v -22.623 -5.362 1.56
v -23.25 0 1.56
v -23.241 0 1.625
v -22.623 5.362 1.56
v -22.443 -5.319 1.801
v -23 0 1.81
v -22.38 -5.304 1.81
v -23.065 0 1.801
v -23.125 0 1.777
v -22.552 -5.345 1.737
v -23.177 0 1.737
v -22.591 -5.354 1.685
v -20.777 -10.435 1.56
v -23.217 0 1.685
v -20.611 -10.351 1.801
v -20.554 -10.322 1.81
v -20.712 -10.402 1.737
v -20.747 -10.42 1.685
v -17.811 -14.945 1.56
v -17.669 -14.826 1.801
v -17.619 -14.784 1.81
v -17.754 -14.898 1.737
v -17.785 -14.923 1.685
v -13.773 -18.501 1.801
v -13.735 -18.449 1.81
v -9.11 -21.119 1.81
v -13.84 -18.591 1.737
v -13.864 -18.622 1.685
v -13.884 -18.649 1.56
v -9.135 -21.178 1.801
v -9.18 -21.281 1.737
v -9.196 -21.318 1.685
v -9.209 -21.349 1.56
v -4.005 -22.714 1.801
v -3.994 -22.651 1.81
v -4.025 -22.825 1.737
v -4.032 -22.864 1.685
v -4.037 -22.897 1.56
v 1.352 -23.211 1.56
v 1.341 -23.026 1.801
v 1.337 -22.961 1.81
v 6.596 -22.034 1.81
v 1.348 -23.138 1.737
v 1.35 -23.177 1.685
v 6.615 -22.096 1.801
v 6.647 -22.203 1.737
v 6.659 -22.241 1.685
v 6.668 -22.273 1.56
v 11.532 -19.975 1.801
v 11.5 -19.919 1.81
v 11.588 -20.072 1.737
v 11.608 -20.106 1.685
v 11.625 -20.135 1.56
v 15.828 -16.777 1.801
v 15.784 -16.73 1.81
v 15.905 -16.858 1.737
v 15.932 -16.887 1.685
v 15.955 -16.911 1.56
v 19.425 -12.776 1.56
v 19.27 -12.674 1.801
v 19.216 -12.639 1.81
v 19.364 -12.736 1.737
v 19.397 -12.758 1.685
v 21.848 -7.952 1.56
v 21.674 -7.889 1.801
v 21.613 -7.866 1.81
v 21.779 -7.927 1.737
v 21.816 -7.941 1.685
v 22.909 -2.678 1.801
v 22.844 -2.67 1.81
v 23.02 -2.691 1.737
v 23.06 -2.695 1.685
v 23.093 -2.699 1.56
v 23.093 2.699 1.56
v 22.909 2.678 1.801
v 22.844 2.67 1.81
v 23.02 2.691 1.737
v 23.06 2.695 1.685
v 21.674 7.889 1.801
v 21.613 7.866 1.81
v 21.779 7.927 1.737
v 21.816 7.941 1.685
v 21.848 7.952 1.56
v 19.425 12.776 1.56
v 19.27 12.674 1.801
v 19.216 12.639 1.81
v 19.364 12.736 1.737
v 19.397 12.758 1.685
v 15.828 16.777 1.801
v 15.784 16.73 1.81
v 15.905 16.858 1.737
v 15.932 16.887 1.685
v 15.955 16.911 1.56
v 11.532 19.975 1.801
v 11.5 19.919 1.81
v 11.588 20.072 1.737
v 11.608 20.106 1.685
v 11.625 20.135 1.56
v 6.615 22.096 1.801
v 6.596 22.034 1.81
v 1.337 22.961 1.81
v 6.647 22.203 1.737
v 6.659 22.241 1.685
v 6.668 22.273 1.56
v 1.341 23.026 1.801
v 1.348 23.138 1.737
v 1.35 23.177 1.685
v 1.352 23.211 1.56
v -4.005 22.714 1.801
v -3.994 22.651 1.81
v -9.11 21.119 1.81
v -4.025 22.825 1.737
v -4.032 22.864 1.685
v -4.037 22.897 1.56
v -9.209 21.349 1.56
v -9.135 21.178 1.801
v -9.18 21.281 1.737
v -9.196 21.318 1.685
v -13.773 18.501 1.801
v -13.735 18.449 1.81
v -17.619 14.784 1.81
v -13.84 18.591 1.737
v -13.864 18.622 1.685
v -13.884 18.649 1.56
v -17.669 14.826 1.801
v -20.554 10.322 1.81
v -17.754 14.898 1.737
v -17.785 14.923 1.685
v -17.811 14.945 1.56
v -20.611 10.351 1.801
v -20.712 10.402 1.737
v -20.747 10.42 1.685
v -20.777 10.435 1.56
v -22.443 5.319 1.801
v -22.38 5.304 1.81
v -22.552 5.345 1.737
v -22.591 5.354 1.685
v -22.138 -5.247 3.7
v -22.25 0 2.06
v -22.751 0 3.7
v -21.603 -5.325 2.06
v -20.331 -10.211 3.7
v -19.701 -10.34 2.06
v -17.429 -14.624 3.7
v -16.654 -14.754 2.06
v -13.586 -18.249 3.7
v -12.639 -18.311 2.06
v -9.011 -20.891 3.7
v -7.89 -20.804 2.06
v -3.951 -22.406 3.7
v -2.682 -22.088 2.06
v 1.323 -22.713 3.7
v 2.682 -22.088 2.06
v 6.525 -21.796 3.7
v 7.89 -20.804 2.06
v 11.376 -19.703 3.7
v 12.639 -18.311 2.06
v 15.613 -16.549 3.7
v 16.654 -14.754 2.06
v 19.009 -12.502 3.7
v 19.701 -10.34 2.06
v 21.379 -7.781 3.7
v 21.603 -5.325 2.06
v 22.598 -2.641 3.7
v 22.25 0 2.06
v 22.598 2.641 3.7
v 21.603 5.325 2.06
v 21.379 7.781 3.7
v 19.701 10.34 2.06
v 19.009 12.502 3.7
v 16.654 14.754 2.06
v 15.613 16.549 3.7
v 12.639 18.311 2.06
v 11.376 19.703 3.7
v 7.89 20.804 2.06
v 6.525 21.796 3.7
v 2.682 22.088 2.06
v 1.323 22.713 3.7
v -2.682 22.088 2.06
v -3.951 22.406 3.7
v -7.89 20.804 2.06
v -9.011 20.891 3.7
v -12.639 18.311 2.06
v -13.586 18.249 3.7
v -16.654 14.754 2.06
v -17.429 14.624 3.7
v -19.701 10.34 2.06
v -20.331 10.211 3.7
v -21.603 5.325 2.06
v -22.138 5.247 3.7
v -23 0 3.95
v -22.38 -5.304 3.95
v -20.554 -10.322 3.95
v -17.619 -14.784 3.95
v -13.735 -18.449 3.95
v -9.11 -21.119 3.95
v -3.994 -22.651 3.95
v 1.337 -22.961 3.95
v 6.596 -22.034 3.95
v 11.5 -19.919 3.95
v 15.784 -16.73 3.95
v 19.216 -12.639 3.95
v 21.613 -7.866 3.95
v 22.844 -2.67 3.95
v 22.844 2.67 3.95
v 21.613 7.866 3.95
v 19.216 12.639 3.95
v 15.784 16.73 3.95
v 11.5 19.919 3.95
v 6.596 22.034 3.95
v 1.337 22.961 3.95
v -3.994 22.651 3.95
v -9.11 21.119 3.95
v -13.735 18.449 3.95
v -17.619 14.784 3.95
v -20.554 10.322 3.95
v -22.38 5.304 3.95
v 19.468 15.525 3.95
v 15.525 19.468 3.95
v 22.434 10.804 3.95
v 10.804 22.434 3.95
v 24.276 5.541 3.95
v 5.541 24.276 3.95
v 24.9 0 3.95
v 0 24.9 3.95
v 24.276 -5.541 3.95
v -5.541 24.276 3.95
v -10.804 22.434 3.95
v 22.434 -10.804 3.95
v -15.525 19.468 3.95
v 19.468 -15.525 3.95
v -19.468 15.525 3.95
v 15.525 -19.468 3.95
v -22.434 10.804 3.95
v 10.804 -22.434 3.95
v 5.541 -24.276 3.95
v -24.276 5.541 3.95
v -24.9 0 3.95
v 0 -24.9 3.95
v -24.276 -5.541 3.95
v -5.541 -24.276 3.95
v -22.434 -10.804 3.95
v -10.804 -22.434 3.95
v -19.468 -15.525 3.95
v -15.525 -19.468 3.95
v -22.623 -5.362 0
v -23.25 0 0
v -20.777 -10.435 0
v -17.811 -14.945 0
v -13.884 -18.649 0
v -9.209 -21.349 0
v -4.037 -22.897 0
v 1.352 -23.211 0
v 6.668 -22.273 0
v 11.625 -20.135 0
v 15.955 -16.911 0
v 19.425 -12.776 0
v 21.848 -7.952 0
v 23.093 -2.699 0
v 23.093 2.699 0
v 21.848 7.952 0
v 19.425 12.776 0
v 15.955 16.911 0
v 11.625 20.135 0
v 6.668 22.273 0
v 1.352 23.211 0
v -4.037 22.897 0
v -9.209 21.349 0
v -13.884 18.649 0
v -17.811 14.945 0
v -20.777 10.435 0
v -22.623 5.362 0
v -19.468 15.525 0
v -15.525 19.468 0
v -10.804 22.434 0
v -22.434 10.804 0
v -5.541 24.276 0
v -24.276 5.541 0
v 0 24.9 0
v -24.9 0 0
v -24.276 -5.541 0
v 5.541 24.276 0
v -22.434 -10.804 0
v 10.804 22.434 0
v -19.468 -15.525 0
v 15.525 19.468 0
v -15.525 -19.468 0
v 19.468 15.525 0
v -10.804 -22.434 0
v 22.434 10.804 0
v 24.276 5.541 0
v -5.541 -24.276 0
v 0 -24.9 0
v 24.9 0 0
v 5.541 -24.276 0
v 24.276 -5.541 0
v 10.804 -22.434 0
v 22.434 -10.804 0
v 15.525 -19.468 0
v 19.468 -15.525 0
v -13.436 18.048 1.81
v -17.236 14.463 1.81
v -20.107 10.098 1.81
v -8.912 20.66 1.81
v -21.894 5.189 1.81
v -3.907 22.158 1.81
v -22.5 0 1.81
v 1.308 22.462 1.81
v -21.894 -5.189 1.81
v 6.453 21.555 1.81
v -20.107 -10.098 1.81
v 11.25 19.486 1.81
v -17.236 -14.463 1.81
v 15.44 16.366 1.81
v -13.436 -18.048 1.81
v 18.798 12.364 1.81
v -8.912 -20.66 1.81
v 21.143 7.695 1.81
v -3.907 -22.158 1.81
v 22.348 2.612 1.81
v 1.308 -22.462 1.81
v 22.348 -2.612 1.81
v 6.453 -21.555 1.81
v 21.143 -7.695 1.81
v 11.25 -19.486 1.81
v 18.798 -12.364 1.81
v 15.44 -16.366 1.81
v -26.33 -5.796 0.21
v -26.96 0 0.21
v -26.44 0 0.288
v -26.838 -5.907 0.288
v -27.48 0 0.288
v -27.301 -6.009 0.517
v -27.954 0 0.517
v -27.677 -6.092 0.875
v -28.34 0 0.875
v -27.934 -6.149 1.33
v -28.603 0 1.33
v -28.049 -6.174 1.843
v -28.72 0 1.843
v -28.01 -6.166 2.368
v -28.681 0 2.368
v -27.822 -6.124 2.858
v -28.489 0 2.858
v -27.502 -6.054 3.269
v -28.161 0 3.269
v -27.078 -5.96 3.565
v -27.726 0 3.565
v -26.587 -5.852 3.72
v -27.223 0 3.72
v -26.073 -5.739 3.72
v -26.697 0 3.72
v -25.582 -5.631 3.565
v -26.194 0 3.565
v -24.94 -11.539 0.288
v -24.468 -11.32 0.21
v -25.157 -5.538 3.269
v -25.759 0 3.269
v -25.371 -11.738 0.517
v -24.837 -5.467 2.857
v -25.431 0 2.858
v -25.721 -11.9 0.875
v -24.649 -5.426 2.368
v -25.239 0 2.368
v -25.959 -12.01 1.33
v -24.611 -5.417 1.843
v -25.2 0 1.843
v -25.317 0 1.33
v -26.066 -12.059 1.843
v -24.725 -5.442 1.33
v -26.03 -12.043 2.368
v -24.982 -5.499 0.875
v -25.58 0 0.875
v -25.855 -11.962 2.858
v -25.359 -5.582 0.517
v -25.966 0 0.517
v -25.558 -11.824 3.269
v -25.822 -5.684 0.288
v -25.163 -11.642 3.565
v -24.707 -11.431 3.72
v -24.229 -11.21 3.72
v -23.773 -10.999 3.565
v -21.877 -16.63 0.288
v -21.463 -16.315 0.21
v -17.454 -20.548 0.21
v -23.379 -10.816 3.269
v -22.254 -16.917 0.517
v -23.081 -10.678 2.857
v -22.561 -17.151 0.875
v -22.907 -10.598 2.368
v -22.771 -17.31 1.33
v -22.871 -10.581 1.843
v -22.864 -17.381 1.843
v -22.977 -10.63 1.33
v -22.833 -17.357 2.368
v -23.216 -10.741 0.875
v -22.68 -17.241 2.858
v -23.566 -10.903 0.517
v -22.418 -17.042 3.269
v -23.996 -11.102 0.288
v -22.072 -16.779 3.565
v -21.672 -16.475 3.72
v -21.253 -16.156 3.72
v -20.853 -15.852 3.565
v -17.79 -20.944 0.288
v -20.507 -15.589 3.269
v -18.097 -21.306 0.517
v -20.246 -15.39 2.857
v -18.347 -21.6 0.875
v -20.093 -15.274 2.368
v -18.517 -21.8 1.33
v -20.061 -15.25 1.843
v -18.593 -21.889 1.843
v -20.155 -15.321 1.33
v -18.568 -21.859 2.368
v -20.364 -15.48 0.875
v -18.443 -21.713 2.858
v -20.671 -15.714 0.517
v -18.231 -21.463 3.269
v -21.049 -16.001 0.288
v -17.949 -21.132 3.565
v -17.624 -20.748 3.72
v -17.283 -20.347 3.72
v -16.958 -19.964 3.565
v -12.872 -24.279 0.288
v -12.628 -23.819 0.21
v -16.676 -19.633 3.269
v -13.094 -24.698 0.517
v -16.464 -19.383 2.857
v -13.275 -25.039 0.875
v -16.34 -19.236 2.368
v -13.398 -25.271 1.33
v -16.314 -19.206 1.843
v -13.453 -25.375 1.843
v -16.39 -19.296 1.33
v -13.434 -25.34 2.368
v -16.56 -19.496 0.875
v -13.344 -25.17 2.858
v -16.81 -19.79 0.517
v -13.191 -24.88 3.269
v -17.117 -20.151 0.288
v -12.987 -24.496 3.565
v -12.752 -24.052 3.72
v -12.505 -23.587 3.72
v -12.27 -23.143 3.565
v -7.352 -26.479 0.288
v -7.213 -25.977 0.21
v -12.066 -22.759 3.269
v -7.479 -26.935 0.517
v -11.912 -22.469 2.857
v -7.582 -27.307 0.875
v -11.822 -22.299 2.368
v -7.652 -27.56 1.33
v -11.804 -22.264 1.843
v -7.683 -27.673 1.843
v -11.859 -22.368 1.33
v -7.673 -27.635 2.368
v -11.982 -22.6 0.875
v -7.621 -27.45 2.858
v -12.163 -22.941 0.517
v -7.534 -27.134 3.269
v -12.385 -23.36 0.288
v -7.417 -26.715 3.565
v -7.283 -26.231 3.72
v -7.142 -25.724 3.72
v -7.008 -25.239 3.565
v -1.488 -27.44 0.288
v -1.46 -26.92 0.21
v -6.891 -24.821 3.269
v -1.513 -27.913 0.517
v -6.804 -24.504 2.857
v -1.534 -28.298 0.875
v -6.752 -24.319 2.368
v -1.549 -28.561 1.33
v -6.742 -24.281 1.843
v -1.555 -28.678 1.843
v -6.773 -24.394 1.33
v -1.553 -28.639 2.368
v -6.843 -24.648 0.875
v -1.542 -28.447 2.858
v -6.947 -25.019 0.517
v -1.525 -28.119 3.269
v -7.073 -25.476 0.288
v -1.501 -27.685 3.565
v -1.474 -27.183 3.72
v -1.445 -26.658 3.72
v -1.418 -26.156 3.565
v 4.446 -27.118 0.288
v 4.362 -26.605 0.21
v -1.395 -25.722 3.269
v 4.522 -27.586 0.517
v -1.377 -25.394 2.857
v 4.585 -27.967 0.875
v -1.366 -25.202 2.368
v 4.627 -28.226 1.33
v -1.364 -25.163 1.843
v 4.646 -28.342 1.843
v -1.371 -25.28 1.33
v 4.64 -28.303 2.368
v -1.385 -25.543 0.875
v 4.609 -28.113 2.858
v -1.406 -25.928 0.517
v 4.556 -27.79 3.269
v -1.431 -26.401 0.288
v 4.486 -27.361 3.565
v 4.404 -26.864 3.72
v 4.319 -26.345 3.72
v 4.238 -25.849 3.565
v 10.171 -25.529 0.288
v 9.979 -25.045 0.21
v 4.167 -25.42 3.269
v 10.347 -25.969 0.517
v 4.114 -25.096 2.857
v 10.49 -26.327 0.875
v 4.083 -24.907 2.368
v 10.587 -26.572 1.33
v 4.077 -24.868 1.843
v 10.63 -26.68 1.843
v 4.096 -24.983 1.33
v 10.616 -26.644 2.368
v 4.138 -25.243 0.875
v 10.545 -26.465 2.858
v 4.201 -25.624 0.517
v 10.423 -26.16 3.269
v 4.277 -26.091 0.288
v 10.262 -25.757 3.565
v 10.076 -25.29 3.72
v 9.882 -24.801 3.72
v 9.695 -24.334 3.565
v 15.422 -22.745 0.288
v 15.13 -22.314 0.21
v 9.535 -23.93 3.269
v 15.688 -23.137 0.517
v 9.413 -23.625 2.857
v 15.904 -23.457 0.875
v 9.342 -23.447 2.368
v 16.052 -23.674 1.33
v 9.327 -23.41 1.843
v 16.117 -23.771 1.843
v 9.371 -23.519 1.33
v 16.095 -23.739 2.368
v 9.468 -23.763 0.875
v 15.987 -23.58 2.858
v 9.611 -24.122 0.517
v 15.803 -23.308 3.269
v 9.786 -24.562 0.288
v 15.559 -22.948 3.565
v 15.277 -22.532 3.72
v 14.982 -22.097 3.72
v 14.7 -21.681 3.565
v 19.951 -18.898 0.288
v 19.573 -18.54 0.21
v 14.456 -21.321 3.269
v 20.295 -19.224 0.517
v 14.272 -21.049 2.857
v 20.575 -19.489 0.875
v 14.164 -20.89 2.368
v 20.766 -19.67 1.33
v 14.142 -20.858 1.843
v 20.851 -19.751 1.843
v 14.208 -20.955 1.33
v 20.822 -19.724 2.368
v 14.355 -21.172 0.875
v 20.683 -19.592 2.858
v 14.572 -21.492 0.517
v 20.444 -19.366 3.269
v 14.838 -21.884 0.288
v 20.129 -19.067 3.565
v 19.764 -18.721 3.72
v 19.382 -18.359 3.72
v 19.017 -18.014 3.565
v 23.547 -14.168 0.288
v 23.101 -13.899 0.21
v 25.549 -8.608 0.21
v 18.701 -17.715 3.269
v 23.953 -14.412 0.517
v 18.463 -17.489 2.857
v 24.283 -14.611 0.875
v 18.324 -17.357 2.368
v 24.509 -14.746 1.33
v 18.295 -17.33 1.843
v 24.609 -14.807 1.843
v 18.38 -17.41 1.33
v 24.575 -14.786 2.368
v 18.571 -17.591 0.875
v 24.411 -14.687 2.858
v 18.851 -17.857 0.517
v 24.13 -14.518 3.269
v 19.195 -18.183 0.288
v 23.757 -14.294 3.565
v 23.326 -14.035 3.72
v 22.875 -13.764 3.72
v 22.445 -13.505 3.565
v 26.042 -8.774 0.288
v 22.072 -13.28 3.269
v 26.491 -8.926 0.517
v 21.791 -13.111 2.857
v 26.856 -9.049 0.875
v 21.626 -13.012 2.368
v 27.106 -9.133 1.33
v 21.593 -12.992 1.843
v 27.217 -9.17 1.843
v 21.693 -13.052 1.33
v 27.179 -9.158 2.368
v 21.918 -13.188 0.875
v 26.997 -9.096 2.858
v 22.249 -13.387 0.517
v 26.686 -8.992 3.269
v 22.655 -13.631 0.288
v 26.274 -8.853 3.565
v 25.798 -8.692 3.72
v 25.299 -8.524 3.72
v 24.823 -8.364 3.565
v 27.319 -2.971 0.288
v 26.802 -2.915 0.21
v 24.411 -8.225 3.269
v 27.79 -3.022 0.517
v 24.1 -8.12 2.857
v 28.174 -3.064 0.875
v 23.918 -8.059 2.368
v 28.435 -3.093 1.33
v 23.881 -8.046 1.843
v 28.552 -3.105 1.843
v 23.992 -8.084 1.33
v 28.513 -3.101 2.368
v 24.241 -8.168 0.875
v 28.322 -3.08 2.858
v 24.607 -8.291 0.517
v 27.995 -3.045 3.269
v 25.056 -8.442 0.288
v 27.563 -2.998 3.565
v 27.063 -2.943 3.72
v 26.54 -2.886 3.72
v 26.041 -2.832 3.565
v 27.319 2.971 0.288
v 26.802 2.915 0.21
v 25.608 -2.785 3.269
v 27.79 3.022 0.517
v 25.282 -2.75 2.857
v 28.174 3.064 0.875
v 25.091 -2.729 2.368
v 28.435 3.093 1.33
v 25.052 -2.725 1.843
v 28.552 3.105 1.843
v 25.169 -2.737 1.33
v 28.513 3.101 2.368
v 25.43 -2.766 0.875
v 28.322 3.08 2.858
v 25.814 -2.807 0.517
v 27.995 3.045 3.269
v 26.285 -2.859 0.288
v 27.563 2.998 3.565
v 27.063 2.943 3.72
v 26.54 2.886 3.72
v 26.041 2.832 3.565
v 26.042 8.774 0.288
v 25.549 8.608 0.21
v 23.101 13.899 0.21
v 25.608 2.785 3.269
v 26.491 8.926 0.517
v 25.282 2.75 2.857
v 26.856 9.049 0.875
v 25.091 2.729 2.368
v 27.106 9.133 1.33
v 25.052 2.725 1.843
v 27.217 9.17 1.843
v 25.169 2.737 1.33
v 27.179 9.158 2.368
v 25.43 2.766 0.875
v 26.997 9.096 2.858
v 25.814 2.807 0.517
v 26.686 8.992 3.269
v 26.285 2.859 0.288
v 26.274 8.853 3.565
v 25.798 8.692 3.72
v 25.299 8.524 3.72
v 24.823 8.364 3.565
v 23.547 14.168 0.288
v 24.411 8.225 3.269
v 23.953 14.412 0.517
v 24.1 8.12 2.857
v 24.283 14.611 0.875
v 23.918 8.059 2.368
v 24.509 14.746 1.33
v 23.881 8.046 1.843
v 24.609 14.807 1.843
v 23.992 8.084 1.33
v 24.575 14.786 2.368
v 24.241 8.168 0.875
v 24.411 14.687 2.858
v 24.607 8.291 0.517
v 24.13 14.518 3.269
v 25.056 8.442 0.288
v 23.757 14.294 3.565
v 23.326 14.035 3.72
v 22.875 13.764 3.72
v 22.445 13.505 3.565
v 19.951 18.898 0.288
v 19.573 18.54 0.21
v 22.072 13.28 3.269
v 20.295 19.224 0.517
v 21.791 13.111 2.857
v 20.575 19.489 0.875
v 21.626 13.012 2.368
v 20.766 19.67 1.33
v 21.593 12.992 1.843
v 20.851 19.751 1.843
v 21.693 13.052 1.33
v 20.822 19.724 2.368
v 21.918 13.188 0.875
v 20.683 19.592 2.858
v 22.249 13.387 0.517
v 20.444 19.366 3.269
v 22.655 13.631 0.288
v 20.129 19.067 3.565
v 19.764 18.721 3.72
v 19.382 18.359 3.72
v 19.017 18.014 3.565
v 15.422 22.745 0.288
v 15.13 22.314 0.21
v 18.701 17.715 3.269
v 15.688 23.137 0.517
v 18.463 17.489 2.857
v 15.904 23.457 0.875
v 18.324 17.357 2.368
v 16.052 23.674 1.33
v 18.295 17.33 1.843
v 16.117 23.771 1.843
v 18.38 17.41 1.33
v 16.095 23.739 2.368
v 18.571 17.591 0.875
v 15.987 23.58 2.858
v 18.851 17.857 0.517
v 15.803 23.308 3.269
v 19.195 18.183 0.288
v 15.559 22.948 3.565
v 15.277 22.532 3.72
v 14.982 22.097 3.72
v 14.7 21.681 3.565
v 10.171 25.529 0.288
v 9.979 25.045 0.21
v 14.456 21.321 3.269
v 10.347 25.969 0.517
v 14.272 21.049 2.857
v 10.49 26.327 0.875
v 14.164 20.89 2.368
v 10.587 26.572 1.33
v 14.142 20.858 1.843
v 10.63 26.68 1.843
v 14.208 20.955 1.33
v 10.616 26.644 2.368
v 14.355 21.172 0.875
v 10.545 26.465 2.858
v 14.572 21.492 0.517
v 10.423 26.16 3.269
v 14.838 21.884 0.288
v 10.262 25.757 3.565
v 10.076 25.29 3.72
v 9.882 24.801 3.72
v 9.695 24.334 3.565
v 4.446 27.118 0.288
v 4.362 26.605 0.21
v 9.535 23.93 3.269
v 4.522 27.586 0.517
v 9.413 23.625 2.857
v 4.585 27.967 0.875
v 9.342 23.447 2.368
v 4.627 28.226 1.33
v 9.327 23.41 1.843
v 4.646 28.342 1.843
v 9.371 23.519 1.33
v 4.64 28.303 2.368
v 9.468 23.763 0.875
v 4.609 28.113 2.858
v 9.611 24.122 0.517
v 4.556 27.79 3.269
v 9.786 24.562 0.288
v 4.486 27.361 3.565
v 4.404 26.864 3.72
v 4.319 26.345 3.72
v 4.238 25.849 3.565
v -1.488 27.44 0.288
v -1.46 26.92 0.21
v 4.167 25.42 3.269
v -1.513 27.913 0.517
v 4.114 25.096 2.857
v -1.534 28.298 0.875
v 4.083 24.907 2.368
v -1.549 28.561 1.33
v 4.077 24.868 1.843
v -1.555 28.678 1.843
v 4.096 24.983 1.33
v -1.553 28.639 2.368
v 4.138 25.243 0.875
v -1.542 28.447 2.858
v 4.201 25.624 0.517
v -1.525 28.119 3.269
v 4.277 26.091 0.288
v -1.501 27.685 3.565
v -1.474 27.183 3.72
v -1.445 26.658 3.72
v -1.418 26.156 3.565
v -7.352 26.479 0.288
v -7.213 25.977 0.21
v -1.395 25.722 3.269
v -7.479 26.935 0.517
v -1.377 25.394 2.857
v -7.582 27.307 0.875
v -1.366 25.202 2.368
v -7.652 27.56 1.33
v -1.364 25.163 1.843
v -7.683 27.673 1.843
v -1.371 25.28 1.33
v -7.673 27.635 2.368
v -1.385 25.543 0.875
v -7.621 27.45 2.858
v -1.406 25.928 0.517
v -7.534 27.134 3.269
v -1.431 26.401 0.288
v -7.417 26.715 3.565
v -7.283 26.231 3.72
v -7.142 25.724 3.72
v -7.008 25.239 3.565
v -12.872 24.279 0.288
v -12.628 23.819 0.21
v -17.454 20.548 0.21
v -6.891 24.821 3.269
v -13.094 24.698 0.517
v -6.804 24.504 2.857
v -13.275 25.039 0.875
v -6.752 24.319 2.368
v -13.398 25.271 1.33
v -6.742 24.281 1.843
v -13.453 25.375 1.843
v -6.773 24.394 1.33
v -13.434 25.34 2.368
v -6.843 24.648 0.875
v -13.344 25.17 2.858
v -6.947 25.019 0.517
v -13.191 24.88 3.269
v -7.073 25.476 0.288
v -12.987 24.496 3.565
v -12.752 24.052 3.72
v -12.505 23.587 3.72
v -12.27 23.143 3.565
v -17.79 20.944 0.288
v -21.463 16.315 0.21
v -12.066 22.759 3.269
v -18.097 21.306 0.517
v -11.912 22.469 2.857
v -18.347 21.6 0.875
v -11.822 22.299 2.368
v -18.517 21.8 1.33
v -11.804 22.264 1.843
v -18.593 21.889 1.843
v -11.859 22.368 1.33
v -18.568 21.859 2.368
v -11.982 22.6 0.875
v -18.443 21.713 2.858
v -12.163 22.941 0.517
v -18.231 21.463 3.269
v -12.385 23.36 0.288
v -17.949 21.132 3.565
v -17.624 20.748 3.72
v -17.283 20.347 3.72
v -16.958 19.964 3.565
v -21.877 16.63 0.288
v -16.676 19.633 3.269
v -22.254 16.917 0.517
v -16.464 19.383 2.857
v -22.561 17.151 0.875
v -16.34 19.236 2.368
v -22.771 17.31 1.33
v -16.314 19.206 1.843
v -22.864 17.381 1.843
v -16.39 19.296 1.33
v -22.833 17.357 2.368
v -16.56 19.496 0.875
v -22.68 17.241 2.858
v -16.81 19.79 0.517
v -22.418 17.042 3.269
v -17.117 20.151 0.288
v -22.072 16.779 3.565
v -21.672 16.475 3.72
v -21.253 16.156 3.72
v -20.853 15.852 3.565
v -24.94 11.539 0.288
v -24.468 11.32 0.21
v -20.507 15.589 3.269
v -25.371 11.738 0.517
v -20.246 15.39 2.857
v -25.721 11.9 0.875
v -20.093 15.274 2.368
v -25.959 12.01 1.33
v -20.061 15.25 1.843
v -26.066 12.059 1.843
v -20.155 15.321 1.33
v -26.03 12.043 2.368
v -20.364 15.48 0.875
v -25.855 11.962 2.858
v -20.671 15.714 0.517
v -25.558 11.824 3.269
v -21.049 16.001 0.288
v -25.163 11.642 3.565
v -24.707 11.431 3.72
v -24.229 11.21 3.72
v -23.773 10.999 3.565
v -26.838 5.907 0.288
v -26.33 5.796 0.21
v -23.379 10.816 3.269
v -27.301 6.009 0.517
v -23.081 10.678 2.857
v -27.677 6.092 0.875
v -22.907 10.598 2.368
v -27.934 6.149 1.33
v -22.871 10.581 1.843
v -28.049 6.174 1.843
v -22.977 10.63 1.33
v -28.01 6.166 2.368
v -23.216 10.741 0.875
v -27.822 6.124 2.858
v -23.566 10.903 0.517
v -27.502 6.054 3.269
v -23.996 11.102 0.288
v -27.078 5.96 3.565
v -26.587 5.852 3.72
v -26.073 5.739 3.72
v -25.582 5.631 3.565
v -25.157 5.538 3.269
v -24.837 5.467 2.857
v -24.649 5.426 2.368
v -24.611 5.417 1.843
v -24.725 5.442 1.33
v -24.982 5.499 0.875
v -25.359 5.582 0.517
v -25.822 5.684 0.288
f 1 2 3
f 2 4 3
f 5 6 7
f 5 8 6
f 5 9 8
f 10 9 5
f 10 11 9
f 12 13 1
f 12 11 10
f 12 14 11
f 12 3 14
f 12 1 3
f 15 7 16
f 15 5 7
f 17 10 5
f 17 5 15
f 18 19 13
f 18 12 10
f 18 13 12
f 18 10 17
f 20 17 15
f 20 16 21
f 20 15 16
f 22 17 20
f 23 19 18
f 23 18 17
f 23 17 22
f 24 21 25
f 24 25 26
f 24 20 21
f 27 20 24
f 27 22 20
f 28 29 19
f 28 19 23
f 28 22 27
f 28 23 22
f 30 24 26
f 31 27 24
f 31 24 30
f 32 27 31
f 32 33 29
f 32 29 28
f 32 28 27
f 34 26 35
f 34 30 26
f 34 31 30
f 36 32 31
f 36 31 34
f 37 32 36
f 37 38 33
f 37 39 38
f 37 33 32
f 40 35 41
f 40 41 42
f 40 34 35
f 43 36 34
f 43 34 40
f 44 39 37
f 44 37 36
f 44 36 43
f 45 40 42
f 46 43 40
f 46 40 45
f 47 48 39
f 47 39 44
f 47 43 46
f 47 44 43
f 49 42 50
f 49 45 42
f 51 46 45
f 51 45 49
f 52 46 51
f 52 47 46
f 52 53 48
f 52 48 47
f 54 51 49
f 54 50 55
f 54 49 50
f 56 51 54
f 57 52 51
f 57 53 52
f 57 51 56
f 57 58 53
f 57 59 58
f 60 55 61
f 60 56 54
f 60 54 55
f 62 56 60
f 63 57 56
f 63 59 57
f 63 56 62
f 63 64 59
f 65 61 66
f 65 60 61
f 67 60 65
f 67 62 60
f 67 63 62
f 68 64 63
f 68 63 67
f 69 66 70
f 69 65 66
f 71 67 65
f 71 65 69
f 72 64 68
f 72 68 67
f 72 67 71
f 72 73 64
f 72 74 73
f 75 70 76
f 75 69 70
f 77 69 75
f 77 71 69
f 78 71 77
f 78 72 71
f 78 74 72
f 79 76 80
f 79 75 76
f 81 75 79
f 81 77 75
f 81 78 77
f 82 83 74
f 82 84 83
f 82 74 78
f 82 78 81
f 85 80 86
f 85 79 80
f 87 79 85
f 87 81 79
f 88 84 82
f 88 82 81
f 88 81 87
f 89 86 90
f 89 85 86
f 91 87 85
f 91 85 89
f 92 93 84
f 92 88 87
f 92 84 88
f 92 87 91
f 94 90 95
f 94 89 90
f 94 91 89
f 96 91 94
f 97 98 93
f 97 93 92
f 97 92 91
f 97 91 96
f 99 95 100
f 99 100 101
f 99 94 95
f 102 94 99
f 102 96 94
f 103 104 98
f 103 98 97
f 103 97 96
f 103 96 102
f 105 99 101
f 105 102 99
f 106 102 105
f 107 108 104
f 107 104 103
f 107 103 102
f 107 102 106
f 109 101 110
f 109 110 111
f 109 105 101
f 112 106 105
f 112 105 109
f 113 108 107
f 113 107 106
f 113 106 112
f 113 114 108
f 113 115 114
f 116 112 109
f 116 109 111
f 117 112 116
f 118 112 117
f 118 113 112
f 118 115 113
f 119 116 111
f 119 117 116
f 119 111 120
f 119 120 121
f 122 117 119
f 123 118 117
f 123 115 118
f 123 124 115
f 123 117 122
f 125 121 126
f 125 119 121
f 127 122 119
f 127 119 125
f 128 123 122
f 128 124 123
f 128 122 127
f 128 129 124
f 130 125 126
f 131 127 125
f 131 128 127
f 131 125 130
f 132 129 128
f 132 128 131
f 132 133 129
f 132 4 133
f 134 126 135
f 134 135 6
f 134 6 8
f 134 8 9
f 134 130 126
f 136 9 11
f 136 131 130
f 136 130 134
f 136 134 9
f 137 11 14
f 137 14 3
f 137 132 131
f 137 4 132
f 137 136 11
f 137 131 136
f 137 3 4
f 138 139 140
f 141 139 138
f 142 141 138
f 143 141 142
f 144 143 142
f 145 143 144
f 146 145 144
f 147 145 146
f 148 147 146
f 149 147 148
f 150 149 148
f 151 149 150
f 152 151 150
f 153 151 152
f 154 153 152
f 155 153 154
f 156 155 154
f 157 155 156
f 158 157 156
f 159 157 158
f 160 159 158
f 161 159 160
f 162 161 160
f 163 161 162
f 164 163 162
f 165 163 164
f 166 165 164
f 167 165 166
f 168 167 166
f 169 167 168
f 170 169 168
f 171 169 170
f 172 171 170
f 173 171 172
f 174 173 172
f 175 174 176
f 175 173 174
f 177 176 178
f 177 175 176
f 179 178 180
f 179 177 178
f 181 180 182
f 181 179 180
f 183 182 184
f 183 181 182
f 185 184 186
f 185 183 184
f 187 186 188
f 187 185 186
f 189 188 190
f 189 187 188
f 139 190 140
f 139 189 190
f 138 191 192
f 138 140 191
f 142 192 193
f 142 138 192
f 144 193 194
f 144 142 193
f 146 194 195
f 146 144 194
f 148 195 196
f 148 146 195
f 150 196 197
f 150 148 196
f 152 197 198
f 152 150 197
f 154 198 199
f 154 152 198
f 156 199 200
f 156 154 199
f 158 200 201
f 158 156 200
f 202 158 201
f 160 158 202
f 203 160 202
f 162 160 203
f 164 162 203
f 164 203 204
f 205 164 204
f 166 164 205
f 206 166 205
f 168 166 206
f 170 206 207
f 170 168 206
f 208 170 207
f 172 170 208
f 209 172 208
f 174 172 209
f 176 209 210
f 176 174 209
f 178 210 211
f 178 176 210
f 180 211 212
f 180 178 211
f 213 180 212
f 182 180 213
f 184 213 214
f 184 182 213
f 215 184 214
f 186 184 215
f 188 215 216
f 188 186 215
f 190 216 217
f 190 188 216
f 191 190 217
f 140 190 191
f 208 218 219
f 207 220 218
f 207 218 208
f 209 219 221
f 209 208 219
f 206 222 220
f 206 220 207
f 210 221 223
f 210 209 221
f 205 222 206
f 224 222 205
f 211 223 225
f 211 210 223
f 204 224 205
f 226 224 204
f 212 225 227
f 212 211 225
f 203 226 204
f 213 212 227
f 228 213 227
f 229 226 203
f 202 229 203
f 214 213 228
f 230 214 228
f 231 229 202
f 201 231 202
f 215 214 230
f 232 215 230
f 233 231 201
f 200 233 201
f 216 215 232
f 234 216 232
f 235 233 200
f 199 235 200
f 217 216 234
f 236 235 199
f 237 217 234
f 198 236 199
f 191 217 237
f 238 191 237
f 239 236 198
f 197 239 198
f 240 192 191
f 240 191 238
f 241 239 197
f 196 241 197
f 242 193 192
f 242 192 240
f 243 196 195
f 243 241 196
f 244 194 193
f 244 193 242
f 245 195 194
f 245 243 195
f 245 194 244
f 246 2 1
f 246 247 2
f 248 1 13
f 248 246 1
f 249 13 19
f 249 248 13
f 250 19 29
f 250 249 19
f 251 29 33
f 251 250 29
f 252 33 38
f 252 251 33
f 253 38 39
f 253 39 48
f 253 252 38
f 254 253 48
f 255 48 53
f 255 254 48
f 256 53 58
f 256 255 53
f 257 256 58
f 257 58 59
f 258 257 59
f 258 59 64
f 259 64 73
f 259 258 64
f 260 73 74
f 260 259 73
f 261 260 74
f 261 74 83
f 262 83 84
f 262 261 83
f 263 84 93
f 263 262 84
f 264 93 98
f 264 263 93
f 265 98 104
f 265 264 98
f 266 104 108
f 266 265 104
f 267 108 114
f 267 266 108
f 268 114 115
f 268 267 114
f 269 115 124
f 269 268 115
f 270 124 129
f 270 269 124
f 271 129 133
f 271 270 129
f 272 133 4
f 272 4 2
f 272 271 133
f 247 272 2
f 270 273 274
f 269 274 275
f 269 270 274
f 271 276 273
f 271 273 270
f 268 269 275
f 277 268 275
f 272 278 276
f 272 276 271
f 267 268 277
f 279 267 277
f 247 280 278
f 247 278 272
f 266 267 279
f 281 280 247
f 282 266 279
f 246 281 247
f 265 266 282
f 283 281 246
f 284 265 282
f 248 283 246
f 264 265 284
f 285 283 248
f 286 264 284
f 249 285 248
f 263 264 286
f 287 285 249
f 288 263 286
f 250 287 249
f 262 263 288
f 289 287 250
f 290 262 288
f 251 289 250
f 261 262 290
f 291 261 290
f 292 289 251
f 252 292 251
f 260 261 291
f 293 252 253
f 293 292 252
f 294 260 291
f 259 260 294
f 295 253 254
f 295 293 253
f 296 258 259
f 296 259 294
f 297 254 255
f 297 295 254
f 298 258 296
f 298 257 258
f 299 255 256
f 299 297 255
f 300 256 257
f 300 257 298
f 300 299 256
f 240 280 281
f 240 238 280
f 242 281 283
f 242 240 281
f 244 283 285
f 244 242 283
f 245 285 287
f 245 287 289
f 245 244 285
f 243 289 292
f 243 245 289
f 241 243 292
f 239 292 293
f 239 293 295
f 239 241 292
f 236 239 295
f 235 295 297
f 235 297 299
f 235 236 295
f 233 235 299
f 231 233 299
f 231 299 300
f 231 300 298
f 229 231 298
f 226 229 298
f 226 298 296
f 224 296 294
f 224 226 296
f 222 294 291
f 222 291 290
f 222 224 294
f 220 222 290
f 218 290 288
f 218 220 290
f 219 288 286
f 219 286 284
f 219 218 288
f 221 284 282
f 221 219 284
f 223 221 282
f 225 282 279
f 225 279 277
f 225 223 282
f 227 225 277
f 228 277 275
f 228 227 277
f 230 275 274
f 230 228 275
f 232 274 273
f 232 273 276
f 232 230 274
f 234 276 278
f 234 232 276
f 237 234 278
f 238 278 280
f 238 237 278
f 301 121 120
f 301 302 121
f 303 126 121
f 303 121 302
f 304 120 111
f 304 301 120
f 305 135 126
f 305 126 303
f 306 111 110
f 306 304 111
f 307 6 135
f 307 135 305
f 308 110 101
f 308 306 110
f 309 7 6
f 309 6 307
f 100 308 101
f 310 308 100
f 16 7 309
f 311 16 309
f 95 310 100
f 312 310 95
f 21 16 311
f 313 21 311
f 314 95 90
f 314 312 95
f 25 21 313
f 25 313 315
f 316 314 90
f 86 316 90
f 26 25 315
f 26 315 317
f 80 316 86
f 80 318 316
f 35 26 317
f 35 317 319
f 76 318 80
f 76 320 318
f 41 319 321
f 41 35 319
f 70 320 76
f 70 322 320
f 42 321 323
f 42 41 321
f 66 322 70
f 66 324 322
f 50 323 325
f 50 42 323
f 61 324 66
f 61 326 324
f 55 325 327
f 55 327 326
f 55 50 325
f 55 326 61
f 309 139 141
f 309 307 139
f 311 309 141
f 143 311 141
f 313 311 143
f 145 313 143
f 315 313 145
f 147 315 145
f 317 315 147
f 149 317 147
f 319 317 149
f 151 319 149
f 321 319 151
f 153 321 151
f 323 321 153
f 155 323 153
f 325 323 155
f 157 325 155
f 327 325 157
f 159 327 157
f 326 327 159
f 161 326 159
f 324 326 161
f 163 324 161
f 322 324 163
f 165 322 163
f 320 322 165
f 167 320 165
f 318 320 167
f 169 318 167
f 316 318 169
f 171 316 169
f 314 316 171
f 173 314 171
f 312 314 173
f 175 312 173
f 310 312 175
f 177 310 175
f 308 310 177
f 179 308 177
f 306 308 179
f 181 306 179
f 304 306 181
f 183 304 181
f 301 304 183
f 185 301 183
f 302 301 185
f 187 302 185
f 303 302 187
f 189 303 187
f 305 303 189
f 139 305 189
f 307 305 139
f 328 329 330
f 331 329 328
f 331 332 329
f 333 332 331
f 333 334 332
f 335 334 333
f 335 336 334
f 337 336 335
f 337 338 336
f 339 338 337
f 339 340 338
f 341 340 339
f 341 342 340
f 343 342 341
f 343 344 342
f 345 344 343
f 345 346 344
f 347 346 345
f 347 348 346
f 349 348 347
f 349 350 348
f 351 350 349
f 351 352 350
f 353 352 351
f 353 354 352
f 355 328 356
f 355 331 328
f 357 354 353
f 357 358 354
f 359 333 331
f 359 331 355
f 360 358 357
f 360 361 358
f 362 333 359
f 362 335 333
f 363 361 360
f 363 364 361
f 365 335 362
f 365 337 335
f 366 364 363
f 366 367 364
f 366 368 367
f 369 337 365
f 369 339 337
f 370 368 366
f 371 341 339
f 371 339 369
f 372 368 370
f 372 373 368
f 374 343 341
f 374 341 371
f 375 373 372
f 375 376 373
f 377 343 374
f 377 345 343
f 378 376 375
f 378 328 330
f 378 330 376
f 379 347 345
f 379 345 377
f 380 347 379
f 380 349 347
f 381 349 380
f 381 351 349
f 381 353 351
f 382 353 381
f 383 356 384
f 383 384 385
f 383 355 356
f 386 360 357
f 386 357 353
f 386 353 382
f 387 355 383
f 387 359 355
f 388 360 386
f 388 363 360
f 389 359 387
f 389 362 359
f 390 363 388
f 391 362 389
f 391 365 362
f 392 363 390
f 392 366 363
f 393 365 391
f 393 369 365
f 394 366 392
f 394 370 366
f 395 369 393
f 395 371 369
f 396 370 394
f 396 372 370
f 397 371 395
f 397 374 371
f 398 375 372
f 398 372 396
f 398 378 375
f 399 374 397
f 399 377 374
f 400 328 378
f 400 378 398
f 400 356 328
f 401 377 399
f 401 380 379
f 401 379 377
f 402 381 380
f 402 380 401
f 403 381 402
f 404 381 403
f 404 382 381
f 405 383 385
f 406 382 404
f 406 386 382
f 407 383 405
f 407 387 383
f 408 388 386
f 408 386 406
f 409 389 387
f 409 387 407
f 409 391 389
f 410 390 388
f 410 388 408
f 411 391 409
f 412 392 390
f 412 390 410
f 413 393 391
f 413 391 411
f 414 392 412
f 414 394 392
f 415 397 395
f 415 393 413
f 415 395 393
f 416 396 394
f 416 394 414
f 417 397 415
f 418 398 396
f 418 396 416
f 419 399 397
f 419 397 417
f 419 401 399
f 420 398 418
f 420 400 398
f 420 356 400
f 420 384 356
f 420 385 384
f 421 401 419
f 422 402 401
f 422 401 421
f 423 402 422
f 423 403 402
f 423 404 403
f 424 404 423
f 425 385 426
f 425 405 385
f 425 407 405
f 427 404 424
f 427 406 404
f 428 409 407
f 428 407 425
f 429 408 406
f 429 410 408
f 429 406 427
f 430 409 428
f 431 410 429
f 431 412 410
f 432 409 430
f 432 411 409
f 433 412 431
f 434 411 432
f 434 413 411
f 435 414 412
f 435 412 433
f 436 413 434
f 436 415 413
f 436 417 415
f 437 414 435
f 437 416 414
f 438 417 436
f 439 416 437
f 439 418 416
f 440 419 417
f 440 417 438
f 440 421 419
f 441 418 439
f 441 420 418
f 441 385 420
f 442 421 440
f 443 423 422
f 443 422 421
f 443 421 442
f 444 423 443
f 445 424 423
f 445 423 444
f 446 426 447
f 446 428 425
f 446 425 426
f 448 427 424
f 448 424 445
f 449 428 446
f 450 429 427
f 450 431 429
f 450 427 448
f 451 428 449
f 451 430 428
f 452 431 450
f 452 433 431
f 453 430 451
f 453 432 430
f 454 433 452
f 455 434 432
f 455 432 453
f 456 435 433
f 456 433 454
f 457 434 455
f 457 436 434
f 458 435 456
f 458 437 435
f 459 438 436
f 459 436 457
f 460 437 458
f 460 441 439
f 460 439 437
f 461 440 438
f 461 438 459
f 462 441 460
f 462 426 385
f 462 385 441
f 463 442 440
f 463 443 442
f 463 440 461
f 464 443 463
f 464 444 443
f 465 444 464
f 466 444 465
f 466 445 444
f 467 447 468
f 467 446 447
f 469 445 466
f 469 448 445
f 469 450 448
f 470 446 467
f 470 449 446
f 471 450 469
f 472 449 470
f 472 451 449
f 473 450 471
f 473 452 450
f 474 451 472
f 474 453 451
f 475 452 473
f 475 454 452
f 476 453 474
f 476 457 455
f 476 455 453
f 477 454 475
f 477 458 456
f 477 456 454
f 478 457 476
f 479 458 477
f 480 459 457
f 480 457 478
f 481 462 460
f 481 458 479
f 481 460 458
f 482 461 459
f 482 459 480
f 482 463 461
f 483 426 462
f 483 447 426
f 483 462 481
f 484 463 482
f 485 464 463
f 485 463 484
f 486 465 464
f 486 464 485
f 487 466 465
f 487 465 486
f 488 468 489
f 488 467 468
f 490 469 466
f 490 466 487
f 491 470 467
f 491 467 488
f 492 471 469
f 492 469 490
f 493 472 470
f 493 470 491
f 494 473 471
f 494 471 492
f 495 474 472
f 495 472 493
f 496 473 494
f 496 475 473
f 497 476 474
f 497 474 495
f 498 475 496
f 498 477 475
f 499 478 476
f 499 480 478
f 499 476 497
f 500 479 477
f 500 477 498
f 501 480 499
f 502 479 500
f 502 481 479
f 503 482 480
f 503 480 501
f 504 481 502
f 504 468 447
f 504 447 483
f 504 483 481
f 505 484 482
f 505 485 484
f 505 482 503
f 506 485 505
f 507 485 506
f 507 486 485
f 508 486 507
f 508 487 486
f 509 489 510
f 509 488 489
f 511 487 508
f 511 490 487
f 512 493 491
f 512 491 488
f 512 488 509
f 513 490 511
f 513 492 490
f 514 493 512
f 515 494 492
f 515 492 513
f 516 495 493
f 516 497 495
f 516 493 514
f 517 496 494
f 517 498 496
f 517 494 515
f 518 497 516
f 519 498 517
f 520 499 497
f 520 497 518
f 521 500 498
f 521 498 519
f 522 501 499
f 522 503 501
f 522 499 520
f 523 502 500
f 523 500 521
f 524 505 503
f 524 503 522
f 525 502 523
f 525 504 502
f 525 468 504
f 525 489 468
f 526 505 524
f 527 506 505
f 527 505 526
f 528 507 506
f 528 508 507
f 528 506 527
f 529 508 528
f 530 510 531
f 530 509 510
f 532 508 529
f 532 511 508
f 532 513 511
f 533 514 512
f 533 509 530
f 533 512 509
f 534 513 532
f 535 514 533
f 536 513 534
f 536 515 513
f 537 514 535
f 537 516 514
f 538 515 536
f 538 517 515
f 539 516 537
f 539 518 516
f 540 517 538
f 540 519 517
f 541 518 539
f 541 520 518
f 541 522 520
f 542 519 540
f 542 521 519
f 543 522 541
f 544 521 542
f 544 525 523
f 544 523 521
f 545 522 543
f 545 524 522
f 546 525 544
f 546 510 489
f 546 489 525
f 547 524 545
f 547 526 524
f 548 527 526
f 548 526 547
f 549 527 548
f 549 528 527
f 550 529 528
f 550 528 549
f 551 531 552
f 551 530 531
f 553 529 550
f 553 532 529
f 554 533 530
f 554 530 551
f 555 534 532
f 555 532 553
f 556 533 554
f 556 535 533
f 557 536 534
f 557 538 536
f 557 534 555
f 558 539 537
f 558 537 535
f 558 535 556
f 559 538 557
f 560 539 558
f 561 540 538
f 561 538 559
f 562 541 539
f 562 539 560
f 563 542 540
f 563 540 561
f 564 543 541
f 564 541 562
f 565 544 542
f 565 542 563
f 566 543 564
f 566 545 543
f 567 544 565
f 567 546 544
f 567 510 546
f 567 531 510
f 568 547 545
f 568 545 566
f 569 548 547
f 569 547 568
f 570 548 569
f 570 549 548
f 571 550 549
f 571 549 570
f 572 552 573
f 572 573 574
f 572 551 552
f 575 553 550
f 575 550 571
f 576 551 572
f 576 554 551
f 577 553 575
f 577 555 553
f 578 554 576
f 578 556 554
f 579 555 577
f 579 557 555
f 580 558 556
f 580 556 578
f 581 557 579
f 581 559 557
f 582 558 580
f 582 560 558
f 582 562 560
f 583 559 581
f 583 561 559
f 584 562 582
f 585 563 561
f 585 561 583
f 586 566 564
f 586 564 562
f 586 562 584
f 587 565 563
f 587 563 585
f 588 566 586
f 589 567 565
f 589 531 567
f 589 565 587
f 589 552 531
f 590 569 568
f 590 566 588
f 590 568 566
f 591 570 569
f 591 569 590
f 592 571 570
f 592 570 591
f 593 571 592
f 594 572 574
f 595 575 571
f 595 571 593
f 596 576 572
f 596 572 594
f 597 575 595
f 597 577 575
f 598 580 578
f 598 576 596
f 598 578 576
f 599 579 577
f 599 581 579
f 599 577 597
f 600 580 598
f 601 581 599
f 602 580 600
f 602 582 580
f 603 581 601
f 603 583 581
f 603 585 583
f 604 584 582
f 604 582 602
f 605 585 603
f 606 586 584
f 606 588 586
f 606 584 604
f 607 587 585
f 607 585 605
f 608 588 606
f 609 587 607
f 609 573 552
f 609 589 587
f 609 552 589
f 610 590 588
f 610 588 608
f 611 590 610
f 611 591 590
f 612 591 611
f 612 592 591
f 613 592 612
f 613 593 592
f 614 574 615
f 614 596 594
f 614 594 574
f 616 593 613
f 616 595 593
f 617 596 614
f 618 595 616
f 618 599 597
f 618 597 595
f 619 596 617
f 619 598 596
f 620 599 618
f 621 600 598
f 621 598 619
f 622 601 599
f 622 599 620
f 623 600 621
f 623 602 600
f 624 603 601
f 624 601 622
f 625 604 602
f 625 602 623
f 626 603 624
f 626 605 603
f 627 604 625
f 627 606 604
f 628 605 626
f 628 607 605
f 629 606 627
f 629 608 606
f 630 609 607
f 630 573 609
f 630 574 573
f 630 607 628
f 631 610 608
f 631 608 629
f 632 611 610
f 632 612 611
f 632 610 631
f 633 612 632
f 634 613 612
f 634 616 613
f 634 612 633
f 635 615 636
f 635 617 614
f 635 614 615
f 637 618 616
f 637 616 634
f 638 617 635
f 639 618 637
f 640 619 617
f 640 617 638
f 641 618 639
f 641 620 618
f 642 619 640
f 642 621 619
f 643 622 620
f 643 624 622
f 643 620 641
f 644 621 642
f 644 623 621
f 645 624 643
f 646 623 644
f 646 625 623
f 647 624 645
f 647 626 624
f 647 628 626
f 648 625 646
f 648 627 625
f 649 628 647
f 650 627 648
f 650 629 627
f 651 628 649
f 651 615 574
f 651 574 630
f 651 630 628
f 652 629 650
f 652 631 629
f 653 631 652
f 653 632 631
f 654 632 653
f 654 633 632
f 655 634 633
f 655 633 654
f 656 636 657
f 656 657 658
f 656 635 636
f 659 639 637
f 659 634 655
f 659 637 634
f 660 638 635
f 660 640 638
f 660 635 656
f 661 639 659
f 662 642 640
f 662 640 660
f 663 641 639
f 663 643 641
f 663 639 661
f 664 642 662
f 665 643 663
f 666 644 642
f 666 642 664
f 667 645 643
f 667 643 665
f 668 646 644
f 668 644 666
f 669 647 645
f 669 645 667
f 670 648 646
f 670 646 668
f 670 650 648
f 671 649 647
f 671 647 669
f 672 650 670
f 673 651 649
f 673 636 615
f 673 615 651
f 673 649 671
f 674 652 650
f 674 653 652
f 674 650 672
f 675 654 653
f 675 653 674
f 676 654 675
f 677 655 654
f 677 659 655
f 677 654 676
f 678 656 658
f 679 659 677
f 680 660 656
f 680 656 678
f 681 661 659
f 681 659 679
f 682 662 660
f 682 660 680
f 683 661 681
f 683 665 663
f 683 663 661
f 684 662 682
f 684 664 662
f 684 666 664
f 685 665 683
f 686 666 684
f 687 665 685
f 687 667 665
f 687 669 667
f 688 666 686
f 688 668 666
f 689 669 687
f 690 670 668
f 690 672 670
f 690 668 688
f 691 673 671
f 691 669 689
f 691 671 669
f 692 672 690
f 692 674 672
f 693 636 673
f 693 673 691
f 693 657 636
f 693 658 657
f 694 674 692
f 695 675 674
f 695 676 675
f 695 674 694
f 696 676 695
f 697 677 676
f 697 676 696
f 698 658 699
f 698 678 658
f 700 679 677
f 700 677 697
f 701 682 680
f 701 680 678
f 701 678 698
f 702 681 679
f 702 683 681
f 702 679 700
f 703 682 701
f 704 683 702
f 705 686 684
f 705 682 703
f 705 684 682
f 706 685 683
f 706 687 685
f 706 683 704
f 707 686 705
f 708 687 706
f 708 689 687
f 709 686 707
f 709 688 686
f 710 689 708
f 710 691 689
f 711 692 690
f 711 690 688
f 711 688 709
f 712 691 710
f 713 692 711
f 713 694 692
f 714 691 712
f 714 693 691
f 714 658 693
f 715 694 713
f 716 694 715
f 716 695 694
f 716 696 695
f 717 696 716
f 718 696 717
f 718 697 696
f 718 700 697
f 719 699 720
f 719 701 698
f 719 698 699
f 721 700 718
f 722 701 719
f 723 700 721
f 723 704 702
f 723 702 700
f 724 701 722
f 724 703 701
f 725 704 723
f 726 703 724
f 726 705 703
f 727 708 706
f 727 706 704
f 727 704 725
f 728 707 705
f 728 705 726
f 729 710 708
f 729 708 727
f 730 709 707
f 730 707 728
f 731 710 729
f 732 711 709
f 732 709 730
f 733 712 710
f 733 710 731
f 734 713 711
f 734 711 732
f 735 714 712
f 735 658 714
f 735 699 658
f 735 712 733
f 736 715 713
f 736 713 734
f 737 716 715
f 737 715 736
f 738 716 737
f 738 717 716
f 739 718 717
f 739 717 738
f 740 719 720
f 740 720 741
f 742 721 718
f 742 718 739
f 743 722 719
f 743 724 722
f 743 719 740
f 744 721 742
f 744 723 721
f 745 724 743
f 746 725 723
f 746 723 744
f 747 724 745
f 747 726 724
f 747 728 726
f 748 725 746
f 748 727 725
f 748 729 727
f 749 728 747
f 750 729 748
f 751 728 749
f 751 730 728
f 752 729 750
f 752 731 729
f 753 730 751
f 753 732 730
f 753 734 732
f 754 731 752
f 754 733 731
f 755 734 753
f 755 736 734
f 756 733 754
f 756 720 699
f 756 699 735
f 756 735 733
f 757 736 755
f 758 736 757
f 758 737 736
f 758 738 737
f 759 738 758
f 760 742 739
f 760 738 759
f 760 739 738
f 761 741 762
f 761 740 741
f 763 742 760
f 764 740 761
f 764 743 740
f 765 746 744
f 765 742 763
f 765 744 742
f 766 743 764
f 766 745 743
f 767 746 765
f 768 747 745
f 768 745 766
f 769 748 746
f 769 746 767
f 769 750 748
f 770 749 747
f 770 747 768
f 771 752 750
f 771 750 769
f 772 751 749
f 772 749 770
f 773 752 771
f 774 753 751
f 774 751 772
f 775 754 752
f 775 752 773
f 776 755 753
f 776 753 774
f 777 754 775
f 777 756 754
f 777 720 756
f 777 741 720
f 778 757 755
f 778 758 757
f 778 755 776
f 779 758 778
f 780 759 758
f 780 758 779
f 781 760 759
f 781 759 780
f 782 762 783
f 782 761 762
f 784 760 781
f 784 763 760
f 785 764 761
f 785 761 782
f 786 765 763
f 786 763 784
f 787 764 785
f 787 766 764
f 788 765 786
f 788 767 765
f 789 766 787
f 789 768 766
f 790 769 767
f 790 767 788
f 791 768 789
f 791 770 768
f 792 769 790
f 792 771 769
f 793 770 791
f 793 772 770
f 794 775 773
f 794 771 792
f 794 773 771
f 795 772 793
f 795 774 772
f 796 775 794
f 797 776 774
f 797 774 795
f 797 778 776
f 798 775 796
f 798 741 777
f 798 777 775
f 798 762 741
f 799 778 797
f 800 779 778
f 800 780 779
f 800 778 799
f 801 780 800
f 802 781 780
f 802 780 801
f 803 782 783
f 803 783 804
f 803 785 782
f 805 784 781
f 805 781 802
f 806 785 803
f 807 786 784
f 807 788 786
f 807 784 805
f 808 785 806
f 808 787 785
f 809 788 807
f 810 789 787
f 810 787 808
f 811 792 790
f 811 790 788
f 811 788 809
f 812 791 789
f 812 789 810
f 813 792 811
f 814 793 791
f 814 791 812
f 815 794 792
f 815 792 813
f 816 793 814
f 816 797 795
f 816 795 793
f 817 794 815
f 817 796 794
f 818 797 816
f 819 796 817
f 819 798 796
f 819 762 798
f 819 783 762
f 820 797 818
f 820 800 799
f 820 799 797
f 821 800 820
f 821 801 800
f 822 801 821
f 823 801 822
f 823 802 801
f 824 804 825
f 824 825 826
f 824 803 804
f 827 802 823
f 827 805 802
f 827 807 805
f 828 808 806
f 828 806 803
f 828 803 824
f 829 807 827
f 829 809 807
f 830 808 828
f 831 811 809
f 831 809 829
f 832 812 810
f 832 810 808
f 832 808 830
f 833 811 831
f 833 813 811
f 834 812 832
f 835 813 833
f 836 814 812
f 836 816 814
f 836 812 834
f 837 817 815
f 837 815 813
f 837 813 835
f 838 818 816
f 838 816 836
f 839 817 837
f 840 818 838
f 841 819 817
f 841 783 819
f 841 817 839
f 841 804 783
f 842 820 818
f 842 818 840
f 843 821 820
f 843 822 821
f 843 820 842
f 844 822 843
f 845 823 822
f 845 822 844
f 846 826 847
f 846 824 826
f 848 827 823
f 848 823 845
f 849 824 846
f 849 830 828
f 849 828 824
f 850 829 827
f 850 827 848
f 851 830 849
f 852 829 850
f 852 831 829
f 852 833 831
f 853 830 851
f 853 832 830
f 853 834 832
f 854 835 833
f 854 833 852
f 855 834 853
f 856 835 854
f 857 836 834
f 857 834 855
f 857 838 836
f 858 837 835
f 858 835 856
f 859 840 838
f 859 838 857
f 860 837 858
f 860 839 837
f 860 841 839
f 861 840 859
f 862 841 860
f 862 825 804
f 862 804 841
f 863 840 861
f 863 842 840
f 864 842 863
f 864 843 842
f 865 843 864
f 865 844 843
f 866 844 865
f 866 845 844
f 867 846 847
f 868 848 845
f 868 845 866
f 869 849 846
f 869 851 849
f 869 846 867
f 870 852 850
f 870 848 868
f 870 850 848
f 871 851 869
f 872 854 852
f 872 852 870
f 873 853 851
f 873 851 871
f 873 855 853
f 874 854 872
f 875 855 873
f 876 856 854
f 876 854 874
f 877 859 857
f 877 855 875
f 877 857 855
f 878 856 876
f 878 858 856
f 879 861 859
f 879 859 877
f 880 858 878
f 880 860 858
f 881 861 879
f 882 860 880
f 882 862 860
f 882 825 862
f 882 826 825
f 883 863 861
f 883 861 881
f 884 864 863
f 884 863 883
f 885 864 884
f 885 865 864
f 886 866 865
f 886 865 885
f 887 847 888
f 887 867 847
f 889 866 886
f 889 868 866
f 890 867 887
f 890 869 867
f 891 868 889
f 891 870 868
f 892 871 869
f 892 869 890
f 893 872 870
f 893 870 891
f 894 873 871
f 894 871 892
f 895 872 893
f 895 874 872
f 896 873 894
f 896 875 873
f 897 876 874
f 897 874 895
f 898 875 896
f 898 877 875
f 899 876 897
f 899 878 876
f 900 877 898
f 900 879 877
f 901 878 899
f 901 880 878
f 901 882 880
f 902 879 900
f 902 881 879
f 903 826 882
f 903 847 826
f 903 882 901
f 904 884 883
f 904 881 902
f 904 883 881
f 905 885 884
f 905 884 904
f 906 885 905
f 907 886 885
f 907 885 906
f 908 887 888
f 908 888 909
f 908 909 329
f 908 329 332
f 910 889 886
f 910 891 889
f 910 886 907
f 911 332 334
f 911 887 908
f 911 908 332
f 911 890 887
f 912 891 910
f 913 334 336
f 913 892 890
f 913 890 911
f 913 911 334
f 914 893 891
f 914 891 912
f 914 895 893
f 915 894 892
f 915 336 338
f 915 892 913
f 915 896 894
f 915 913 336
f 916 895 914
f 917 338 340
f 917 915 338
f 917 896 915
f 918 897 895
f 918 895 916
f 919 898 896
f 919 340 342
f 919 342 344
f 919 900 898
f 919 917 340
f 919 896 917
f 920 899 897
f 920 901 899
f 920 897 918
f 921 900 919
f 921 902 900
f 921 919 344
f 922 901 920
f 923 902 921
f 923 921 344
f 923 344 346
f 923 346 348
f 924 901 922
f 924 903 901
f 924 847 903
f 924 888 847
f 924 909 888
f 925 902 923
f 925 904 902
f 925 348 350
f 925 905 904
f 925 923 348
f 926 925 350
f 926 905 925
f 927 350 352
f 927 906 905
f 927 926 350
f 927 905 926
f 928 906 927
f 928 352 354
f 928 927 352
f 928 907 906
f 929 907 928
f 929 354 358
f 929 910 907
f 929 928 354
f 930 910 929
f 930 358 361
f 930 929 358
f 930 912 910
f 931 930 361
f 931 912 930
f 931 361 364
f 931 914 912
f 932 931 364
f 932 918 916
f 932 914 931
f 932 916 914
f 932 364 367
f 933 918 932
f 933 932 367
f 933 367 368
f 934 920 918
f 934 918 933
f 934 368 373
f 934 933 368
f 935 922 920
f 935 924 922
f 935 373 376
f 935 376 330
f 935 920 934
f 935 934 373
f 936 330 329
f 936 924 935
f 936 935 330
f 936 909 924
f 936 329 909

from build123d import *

# Parameters (mm, degrees)
SKETCH4_R = 1.765


with BuildPart() as part:
    # Sketch1 → Revolve1 (revolve)
    with BuildSketch(Plane(origin=(0, 0, 0), x_dir=(0, 0, -1), z_dir=(1, 0, 0))):
        with BuildLine():
            Line((0, 23.25), (0, 24.9))
            Line((0, 24.9), (-3.95, 24.9))
            Line((-3.95, 24.9), (-3.95, 23))
            Line((-3.95, 23), (-3.7, 22.751398318))
            Line((-3.7, 22.751398318), (-2.06, 22.25))
            Line((-2.06, 22.25), (-1.81, 22.5))
            Line((-1.81, 22.5), (-1.81, 23))
            ThreePointArc((-1.81, 23), (-1.736776695, 23.176776695), (-1.56, 23.25))
            Line((-1.56, 23.25), (0, 23.25))
        make_face()
    revolve(axis=Axis((0, 0, 0), (0, 0, 1)))


with BuildPart() as body_2:
    # Sketch4 → Revolve2 (revolve)
    with BuildSketch(Plane(origin=(0, 0, 0), x_dir=(0, 0, -1), z_dir=(1, 0, 0))):
        with Locations((-1.975, 26.96)):
            Circle(SKETCH4_R)
    revolve(axis=Axis((0, 0, 0), (0, 0, 1)))


solid = Compound([part.part, body_2.part])
